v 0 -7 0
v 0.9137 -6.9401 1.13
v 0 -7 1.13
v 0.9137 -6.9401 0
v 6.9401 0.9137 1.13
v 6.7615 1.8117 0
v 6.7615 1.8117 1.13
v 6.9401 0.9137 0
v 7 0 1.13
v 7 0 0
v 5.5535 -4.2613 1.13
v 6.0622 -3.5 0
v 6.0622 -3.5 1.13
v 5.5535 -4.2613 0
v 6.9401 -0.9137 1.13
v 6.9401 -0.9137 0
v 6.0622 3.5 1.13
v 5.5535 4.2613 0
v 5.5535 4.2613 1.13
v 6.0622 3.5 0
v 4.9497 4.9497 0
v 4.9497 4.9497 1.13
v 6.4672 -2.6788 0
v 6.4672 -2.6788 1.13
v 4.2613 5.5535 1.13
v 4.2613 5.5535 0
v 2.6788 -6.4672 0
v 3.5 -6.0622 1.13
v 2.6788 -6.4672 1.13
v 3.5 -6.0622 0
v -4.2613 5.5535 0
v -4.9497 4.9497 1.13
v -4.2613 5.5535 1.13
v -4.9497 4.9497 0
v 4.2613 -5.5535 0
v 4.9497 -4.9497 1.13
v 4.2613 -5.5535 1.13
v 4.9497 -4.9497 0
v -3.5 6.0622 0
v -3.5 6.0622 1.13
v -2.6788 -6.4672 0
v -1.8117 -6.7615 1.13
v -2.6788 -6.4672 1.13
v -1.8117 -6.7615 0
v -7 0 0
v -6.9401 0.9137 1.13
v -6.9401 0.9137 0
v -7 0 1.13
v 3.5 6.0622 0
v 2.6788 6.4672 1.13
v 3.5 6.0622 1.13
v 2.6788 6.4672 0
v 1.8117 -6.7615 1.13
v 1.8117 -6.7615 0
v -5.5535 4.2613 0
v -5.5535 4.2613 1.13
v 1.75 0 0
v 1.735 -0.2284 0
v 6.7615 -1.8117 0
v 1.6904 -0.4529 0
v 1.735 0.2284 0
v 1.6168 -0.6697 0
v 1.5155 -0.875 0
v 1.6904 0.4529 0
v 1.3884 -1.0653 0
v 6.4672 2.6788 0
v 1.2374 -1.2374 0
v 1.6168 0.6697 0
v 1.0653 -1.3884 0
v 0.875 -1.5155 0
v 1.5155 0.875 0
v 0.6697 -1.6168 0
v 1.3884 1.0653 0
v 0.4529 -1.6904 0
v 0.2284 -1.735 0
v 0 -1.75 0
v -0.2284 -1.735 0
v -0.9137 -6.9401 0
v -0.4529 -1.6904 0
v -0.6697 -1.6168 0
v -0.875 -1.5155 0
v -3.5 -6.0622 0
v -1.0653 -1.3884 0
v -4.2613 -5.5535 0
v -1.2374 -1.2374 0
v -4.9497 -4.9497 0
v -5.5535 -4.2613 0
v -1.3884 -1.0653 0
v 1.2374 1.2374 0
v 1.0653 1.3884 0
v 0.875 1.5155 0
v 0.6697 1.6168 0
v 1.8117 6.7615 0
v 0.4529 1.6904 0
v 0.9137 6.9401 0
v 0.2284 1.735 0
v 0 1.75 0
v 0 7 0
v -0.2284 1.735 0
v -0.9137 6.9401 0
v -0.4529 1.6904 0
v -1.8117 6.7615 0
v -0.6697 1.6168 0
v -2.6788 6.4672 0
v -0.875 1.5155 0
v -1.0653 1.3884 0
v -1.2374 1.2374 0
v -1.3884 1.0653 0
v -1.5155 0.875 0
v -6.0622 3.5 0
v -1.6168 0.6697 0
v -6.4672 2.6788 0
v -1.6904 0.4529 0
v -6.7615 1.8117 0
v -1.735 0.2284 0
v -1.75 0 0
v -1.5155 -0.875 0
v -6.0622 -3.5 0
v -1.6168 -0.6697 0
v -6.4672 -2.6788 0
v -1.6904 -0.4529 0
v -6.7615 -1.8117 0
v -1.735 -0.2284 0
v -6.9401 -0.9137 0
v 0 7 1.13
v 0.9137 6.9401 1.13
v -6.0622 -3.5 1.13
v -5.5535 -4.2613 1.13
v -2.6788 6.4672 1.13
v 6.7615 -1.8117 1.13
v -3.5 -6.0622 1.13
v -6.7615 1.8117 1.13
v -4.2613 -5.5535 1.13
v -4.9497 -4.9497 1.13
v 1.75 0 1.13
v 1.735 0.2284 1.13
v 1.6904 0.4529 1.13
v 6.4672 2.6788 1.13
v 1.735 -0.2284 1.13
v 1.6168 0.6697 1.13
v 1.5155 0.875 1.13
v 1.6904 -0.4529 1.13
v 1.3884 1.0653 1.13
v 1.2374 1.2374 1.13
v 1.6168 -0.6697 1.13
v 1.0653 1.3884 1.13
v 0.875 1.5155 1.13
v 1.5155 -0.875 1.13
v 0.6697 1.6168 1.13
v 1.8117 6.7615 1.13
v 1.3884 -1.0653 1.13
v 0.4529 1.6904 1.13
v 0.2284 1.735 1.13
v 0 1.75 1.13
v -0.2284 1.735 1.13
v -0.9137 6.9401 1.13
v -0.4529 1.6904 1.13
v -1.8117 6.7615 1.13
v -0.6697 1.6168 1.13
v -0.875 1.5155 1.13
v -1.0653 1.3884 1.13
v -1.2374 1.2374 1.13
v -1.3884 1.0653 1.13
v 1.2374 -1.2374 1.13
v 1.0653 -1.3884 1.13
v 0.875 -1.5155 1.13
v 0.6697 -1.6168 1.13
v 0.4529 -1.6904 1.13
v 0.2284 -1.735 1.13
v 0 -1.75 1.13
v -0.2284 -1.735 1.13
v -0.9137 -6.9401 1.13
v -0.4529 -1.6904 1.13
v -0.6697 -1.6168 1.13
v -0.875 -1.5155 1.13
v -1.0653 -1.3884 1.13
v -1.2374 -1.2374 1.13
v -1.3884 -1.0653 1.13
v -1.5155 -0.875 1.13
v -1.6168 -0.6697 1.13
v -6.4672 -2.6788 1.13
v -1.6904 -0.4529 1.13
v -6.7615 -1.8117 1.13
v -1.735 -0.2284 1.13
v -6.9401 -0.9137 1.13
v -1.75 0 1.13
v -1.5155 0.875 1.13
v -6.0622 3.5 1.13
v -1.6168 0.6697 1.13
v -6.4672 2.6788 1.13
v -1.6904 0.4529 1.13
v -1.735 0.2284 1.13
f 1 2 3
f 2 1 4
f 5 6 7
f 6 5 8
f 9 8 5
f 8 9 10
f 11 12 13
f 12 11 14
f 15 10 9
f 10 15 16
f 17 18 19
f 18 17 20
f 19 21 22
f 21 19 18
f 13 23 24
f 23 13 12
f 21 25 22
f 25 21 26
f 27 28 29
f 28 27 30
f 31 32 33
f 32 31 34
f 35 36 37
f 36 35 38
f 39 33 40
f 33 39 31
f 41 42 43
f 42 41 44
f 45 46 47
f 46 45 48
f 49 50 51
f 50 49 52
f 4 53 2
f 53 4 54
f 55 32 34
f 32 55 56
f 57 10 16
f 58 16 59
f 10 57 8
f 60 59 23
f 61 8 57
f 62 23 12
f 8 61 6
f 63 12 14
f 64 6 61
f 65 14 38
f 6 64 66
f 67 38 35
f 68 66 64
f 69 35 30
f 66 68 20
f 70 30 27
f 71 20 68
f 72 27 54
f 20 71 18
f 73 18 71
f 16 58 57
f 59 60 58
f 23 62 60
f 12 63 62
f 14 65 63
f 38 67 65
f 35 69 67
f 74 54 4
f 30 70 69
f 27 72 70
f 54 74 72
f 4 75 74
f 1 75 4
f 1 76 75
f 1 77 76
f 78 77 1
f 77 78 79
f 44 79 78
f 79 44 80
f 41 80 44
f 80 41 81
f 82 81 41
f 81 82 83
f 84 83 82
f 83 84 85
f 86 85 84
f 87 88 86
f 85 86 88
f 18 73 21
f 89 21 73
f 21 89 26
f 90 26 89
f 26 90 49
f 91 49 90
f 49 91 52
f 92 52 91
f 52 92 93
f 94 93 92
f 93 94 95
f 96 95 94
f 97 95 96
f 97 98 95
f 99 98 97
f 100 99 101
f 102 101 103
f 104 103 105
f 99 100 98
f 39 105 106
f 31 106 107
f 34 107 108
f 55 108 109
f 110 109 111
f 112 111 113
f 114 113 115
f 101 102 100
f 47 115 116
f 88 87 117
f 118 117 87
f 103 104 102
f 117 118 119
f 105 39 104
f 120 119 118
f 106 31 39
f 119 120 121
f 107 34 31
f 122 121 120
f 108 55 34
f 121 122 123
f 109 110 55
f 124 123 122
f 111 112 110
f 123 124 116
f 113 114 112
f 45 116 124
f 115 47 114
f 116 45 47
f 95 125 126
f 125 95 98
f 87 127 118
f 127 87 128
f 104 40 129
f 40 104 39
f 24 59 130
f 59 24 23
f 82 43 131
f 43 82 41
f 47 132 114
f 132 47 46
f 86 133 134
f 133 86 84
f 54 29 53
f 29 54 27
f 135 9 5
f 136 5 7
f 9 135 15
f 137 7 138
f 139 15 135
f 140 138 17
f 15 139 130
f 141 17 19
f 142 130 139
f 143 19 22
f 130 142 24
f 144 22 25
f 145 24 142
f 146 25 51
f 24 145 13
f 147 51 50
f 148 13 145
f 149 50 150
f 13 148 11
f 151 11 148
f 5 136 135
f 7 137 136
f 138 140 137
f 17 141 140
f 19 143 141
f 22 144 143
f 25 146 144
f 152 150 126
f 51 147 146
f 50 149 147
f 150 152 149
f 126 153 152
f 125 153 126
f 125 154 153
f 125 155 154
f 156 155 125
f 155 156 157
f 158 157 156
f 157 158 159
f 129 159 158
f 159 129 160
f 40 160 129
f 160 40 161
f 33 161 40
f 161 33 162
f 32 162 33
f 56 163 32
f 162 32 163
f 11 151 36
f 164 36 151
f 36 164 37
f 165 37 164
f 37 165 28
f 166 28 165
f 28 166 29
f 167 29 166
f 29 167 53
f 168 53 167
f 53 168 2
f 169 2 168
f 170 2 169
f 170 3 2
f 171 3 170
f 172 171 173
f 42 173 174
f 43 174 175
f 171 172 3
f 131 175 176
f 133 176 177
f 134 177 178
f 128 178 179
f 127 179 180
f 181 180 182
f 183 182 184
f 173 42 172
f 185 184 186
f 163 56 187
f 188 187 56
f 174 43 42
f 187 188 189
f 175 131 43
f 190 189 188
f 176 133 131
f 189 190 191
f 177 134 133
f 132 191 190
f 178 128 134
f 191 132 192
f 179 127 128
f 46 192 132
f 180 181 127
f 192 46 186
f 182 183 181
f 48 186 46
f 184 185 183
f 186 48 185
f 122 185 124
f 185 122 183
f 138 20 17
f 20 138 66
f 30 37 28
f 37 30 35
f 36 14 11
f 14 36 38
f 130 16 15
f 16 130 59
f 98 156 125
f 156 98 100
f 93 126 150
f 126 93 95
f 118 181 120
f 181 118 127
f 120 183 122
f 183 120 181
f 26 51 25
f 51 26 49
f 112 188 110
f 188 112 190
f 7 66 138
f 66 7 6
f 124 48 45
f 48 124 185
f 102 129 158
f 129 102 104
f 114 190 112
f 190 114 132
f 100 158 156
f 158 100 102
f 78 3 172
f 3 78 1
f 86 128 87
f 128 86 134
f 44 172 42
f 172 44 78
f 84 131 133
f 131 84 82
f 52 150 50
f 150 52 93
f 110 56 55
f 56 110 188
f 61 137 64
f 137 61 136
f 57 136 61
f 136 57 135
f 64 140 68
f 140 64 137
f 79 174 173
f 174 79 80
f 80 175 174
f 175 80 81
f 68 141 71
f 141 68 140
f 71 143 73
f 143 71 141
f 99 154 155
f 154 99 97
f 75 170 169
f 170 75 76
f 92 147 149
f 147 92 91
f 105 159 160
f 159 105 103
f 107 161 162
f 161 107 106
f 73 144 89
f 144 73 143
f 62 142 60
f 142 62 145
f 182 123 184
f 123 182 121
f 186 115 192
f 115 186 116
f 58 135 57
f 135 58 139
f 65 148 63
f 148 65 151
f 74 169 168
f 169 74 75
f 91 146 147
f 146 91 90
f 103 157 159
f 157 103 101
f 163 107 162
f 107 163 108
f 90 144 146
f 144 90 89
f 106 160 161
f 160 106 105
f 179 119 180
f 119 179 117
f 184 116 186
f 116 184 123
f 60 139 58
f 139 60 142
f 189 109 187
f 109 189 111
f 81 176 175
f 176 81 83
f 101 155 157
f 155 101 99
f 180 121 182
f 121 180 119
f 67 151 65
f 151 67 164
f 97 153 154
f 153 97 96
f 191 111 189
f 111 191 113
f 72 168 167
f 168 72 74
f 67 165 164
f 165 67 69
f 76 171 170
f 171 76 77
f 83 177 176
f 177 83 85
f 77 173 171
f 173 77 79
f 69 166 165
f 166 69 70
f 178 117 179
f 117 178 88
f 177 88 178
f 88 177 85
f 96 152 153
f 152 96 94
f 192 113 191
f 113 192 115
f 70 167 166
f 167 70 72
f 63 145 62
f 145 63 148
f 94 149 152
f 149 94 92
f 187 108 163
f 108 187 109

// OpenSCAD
// file: parameters.scad
// =============================================================================
// Gen-AQ Dual-rotor copper-centroid ultra AFPM - WOUND-AWARE (HARD GATE)
// PRIMARY challenger vs Gen-AN. Magnets @ R=39.0 + 205 t + former_web 1.25 -> m2m 4.71.
// =============================================================================

// --- Wire / wind budget (26 AWG, ~1 lb spool ~ 390 m bare-equiv) --------------
wire_awg            = 26;
wire_od             = 0.45;     // insulated OD mm
turns               = 205;      // +5 vs Gen-AN 200
fill                = 0.70;
layers_per_face     = 2;        // axial layers proud of EACH flange
wind_build_axial    = layers_per_face * wire_od * fill;   // 0.63 mm
wind_build_radial   = 3 * wire_od * fill;                 // 0.945 mm

// --- Pancake former (bare STL) -----------------------------------------------
coil_id_r           = 15.0;     // copper-centroid window centered ~R=39.0
coil_od_r           = 63.0;
span_deg            = 26.0;     // 12 stations x 30 deg pitch
former_web          = 1.25;     // thinner vs AN 1.30 (print-safe >=1.20 LB)
flange_t            = 0.60;
wall                = 1.2;
slot_w              = 2.4;
mount_hole          = 3.5;
tab_len             = 7.0;

former_bare_h       = former_web + 2 * flange_t;            // 2.45 mm
coil_envelope_h     = former_bare_h + 2 * wind_build_axial; // 3.71 mm

// --- Running clearance (magnet face -> WOUND face) EACH side ------------------
run_clear           = 0.50;     // PASS floor >= 0.5
gap_spacer_h        = run_clear + wind_build_axial;         // 1.13 mm
m2m                 = coil_envelope_h + 2 * run_clear;      // 4.71 mm (beats Gen-AN 4.76)

// --- Mid stator (12 pancakes 3ph; winds proud both faces) ---------------------
coil_stations       = 12;
bay_r_in            = coil_id_r - 2.0 - wind_build_radial;
bay_r_out           = coil_od_r + 2.0 + wind_build_radial;
bay_span            = span_deg + 4.0;
bay_offset          = 2.0;
stator_thick        = former_bare_h;                        // winds proud +/-Z
stator_od           = 160.0;
shaft_clear_stator  = 34.0;
coil_mount_r        = 25.0;

// --- Rotors (x2) - 8xO20 @ R=39.0 (copper centroid) + 24xO5 Halbach ----------
large_pocket_d      = 20.3;
small_pocket_d      = 5.3;
pocket_h            = 5.2;
large_n             = 8;
R_large             = 39.0;     // covers ~29-49 over copper centroid ~39.0
R_small_inner       = 24.0;
R_small_mid         = 39.0;
R_small_outer       = 56.0;
carrier_od          = 156.0;
carrier_thick       = 7.5;
hub_h               = 10.0;
hub_od              = 30.0;
rotor_b_offset_deg  = 22.5;

// --- Modular MAX interface (Gen-E family) ------------------------------------
shaft_bore          = 8.35;
bearing_d           = 21.85;
bearing_h           = 7.2;
m3_clear            = 3.5;
bolt_r_inner        = 36.0;
bolt_n_inner        = 6;
flange_bolt_r       = 72.0;
flange_bolt_n       = 6;
brace_r             = 68.0;
brace_d             = 4.3;
brace_n             = 4;

spacer_pad_od       = 14.0;
spacer_pad_id       = m3_clear;
endbell_od          = 160.0;
endbell_thick       = 8.0;
endbell_shaft_clear = 10.0;

$fn = 64;
// main file
// Gen-AQ gap spacer — h = run_clear + wind_build_axial
include <parameters.scad>;
$fn = 48;
difference() {
    cylinder(d=spacer_pad_od, h=gap_spacer_h);
    translate([0, 0, -0.1]) cylinder(d=spacer_pad_id, h=gap_spacer_h + 0.2);
}
